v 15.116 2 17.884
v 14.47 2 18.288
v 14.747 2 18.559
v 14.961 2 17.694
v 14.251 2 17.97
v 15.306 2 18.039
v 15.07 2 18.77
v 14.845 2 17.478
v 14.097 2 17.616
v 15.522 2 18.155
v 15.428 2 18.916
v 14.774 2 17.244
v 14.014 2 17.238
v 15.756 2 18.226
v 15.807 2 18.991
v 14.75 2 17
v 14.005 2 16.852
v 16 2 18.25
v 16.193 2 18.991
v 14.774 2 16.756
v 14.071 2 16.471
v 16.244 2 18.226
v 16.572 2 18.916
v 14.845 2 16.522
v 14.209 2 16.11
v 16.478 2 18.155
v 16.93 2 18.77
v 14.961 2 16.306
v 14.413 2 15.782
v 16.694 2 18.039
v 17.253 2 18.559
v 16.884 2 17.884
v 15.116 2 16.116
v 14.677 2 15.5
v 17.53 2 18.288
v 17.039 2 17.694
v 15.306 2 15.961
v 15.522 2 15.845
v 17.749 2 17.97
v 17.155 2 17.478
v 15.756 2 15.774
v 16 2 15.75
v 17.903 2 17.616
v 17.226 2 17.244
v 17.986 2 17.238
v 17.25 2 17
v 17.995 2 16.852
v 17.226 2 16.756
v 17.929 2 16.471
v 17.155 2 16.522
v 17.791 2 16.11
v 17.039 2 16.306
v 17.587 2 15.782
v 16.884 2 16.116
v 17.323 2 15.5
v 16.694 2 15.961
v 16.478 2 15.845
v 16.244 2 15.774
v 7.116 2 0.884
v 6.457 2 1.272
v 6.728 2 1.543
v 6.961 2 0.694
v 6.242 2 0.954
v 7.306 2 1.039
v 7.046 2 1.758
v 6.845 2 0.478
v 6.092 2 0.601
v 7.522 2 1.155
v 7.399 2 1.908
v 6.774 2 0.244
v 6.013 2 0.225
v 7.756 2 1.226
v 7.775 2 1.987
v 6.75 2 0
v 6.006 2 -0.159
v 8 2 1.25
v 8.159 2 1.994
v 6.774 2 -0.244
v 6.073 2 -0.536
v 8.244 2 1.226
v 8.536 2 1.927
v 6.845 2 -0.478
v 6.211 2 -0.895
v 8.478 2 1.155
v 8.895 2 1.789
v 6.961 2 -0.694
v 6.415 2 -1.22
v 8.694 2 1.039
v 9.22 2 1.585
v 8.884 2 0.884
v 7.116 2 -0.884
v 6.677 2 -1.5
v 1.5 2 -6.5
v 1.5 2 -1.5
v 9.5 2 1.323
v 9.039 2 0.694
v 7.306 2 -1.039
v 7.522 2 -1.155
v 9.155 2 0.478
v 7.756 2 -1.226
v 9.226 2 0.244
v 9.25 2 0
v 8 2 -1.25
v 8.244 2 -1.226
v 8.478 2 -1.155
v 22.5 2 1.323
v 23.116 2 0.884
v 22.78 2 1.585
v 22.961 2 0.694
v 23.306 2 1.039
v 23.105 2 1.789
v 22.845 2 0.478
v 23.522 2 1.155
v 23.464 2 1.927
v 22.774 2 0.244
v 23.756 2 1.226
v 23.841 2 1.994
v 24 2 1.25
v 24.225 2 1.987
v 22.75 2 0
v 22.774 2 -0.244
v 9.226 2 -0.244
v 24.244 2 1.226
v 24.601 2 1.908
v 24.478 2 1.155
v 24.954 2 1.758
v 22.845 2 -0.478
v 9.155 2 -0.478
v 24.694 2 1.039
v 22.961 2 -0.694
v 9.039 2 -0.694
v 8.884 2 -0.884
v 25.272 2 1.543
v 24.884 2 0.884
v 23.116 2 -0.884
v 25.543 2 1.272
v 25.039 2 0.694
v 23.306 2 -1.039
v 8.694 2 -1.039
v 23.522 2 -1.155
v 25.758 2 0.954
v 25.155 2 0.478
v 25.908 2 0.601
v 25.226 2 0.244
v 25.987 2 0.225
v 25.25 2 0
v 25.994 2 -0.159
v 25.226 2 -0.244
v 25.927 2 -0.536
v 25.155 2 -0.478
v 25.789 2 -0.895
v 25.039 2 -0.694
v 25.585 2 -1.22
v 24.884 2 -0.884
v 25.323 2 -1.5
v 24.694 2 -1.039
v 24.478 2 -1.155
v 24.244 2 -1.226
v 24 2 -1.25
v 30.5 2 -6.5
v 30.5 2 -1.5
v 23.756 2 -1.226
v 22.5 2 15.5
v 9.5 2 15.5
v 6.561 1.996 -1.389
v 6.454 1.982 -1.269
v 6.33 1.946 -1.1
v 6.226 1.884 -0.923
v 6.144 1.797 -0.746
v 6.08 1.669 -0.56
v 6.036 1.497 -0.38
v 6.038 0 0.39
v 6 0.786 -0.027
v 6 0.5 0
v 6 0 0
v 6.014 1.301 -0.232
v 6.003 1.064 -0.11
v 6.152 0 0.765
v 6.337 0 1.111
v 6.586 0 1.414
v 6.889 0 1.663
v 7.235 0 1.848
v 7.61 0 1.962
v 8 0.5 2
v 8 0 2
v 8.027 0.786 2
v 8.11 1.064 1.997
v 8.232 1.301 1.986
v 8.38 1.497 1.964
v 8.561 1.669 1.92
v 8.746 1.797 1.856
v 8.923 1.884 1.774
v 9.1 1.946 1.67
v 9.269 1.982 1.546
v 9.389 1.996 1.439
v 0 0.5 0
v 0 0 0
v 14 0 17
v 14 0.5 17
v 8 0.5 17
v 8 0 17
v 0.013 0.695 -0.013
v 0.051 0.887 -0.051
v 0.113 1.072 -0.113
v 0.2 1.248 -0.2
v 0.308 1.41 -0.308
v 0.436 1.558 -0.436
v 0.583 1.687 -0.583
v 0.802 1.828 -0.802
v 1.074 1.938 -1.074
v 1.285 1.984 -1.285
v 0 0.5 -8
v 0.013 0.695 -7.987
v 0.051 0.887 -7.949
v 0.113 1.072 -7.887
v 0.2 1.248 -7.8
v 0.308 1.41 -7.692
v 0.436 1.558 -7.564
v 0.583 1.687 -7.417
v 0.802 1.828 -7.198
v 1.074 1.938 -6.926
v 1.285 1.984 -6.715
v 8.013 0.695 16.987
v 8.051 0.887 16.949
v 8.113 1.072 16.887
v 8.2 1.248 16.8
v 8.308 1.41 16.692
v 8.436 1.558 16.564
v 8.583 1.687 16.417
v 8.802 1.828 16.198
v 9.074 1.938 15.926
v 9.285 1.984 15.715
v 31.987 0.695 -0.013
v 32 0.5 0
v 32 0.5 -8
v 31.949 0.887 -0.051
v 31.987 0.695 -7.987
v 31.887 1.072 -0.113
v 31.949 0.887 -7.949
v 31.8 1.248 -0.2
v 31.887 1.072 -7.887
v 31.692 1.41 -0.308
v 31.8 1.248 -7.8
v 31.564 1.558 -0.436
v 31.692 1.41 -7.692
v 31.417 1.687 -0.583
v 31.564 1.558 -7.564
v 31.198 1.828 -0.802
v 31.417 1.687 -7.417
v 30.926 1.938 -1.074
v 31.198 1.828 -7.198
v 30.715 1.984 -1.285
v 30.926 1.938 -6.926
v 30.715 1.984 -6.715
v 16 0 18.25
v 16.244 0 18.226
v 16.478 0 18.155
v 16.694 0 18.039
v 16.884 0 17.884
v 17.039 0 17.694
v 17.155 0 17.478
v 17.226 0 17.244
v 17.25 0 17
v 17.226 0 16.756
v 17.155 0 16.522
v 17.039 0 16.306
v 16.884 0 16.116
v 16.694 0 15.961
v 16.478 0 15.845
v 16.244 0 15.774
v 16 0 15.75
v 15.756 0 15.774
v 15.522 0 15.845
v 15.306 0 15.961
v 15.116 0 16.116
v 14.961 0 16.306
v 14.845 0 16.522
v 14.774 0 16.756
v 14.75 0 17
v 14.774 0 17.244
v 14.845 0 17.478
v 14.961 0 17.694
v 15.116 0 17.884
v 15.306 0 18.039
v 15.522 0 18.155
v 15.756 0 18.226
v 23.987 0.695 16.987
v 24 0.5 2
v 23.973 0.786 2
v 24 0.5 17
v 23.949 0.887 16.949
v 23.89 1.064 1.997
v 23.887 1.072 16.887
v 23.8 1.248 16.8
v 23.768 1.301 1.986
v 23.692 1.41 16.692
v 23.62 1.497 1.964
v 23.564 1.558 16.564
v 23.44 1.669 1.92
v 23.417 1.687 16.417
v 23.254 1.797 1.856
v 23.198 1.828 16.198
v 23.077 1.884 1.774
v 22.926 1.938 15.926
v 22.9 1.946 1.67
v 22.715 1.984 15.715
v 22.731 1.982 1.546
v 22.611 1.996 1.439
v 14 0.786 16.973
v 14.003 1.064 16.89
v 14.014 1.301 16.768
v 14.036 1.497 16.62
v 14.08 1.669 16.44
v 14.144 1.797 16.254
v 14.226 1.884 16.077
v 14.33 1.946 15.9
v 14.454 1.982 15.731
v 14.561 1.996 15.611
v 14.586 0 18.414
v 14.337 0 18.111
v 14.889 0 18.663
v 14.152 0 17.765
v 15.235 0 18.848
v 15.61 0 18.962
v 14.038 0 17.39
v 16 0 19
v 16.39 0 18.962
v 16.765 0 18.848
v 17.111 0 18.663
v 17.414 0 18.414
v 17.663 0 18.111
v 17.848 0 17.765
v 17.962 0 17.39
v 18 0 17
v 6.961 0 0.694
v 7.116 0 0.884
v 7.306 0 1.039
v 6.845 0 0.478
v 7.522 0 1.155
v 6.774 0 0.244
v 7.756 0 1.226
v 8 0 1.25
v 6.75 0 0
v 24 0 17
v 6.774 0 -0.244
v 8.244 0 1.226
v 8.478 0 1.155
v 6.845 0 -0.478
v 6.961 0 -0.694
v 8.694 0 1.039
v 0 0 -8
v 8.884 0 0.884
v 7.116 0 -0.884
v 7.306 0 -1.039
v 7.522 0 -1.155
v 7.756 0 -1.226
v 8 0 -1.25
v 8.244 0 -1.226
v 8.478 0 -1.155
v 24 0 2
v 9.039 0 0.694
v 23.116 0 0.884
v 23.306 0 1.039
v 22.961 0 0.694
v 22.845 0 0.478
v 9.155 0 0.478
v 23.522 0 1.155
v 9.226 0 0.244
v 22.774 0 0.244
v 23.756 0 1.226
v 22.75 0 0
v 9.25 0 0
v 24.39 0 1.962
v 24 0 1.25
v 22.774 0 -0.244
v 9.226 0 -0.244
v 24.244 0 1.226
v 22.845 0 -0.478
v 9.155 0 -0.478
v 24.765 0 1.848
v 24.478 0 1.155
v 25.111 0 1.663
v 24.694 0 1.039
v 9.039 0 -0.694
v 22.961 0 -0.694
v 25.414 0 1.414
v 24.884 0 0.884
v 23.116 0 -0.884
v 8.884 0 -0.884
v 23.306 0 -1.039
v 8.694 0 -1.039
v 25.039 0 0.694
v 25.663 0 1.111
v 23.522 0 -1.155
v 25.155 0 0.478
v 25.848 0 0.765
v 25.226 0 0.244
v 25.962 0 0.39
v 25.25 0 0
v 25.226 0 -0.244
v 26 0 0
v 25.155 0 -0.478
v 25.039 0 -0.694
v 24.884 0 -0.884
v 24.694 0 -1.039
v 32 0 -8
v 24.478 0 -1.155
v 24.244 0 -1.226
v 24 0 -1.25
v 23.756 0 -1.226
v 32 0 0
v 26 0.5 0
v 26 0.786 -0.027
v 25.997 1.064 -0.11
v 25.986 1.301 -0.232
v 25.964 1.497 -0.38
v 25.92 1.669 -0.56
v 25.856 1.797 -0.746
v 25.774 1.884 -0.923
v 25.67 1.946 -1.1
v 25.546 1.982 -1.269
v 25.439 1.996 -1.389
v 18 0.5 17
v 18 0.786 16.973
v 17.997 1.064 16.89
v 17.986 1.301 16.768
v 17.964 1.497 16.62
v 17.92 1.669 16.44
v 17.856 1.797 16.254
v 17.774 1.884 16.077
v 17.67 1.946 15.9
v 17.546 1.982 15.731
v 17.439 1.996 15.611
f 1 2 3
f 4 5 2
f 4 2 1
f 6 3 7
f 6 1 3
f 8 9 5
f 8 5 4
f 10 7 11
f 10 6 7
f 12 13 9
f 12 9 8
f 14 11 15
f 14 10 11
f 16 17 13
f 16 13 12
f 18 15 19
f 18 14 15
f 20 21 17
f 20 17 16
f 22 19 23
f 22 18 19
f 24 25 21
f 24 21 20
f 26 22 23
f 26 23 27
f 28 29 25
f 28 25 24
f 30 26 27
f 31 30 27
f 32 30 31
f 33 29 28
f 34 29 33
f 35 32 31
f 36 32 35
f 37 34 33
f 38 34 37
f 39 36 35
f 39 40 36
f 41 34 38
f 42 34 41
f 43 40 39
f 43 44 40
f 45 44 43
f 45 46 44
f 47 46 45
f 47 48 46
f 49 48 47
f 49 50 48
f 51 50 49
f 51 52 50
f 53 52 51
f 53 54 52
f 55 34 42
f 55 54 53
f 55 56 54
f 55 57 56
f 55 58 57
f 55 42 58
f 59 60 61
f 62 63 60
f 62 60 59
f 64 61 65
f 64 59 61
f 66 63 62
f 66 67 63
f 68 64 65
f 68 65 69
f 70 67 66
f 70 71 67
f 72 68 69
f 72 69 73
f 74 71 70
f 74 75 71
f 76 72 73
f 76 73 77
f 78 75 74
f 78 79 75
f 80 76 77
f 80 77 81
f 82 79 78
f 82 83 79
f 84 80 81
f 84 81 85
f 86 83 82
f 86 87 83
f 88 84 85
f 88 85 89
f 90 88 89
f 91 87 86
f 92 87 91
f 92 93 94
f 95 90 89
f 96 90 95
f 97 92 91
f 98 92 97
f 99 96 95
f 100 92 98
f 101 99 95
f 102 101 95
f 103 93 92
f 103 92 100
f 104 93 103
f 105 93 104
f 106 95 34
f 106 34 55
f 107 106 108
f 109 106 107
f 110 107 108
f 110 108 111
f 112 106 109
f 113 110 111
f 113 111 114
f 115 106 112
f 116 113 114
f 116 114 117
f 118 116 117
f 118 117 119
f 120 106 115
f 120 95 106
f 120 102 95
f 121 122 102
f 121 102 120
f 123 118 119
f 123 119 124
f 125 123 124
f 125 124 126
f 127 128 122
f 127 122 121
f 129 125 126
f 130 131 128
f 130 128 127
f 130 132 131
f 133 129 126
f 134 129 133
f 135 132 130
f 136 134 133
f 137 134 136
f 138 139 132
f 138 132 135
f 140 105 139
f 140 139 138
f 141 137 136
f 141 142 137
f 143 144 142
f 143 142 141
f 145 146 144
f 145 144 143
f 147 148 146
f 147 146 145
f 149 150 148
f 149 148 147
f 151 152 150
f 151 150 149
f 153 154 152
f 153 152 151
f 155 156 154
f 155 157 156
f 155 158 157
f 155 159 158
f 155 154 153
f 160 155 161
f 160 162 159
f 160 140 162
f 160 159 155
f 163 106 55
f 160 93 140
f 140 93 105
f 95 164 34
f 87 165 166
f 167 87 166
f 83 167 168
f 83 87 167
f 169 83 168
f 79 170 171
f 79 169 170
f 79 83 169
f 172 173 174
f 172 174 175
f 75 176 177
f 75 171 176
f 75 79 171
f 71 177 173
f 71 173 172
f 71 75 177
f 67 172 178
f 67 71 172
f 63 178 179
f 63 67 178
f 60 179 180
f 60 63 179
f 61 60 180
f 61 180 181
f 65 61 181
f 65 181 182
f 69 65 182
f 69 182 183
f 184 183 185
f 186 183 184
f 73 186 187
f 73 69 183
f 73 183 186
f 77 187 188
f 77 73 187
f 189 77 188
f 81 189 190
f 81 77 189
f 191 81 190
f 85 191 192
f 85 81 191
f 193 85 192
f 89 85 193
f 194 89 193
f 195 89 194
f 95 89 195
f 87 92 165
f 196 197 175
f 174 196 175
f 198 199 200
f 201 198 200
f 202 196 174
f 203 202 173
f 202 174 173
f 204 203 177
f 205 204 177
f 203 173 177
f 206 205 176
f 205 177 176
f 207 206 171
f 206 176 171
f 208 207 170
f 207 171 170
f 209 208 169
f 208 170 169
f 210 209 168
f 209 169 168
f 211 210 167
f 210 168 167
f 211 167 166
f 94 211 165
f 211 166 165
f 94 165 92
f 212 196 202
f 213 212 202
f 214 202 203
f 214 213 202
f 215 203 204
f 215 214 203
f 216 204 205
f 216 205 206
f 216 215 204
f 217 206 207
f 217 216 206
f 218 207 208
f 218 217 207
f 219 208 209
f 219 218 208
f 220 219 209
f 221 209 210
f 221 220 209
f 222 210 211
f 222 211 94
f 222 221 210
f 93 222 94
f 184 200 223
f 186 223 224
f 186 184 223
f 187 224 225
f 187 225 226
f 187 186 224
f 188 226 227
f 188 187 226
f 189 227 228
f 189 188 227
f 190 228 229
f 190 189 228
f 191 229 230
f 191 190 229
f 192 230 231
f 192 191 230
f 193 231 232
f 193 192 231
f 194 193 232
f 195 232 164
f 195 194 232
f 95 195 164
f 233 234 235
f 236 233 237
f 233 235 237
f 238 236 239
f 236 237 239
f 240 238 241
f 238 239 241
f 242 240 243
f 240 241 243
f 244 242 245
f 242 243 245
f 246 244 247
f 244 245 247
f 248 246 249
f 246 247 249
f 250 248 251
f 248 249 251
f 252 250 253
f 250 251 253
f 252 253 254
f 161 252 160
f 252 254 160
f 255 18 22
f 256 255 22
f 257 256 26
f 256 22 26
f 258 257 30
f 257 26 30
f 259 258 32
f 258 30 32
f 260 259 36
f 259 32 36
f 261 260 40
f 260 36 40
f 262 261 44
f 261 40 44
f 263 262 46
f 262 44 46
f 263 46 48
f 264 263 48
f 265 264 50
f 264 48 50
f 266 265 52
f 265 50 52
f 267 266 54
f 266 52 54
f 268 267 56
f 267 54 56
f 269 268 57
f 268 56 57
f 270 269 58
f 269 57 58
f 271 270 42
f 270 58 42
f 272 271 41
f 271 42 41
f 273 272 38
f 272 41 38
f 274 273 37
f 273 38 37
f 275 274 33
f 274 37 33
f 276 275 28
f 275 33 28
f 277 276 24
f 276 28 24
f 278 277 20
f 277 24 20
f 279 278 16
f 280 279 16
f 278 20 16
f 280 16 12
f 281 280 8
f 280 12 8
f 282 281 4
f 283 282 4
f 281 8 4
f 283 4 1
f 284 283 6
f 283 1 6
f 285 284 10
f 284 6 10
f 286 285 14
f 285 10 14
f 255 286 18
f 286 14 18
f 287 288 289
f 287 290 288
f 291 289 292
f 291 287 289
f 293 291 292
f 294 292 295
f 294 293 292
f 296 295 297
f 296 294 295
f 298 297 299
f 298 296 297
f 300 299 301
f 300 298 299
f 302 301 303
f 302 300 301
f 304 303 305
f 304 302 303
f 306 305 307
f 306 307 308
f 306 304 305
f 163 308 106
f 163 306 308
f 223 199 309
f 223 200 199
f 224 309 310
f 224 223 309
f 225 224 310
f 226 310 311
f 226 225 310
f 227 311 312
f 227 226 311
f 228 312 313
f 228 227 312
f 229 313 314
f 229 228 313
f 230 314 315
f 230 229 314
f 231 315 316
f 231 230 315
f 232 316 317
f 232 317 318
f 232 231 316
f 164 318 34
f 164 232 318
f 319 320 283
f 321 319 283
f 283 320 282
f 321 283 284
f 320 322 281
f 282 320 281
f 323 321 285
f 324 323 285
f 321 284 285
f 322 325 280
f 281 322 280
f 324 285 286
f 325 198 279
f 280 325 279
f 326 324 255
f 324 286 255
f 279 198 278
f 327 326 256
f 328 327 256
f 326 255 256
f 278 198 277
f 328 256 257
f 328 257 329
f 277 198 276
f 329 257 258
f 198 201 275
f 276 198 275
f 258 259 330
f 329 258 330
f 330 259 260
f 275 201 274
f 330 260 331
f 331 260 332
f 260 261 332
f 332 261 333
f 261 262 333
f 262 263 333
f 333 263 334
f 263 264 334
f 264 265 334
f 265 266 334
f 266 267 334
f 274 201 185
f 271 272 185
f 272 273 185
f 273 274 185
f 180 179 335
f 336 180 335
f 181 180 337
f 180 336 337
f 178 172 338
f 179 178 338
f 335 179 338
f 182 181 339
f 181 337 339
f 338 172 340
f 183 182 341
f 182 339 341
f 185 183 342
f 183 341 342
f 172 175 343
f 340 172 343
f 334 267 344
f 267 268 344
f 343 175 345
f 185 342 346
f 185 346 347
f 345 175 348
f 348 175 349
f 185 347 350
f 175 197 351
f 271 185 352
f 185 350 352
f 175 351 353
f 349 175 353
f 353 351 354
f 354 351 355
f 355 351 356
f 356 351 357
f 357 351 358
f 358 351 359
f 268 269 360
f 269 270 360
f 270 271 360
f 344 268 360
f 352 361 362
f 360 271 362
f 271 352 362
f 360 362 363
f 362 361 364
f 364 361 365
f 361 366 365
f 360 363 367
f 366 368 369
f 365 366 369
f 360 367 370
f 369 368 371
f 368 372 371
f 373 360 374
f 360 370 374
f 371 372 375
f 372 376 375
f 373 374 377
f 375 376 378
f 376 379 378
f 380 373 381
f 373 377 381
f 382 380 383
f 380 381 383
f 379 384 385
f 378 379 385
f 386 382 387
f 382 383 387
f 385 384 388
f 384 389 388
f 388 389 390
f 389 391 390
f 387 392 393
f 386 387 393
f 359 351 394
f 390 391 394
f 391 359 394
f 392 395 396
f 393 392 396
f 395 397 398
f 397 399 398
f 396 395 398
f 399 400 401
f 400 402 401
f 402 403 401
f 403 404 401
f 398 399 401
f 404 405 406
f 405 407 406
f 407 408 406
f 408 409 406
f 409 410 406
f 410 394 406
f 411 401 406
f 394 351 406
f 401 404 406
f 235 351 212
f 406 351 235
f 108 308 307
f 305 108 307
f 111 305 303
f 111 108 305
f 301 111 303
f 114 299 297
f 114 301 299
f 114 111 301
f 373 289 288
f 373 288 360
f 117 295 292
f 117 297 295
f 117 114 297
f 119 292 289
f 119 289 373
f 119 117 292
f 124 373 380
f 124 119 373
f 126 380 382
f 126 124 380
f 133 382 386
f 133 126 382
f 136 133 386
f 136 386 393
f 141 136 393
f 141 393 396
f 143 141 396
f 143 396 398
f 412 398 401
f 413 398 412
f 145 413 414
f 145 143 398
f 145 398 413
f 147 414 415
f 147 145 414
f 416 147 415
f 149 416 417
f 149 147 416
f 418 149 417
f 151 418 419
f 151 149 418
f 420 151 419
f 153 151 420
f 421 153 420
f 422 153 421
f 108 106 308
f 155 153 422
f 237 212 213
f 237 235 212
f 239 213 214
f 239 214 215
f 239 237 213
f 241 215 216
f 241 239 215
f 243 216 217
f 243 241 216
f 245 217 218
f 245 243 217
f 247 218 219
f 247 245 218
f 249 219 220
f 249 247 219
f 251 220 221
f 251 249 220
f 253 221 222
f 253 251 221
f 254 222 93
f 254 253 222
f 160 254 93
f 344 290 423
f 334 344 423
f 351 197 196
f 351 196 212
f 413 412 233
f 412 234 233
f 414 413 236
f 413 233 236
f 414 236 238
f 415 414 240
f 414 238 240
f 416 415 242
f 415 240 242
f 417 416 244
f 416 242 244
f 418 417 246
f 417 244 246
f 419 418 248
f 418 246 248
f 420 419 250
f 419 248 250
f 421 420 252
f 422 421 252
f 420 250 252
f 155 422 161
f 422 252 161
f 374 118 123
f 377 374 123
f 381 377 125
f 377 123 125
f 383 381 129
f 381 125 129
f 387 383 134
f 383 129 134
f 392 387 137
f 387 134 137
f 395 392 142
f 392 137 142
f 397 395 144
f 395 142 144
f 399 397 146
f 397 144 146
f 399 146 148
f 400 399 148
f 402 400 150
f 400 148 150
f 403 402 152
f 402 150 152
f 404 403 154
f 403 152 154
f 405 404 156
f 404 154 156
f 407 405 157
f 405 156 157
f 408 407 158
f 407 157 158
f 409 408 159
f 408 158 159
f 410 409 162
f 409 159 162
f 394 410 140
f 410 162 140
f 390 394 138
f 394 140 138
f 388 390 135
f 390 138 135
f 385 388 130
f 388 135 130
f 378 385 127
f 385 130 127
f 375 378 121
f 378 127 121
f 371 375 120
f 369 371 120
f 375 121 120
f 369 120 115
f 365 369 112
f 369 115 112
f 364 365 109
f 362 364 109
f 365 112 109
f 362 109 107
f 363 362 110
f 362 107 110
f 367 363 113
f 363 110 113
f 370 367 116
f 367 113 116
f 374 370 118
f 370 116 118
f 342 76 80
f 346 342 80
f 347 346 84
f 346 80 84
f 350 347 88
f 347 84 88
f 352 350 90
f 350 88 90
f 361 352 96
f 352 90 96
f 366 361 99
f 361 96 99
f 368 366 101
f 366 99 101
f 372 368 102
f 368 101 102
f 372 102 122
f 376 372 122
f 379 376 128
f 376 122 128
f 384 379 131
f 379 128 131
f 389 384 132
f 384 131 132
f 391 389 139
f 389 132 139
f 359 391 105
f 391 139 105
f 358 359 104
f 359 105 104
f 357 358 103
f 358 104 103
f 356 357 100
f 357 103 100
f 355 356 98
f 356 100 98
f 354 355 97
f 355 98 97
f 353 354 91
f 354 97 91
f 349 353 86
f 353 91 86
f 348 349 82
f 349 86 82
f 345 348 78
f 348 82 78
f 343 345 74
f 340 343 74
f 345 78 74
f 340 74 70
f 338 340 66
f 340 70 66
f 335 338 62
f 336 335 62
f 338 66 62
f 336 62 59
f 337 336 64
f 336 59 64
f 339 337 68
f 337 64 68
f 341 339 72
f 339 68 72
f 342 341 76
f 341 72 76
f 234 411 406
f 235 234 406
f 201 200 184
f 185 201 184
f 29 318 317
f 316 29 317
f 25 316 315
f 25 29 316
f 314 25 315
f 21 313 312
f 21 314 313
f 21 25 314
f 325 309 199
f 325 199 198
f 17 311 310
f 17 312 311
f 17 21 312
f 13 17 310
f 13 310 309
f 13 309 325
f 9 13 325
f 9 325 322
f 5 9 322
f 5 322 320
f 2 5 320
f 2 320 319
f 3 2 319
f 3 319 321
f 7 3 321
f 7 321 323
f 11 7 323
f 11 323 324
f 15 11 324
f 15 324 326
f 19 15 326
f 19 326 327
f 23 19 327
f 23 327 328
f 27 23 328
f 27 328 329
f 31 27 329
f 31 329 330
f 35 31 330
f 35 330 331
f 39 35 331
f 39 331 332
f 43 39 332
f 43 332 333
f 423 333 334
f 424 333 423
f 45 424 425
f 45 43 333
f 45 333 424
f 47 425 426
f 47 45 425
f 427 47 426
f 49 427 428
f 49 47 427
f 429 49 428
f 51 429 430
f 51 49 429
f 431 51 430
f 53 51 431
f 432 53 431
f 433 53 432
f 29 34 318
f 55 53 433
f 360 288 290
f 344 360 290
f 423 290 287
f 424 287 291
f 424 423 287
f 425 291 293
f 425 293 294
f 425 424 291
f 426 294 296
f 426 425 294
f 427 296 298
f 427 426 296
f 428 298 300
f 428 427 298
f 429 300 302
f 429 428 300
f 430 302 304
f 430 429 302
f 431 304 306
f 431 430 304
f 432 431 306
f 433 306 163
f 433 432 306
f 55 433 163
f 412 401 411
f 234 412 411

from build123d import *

# Parameters (mm, degrees)
ESQUISSE1_W             = 32
ESQUISSE1_H             = 8
BOSS_EXTRU_1_DEPTH      = 2
BOSS_EXTRU_2_DEPTH      = 2
ESQUISSE3_R             = 1.9999999999999996
ESQUISSE3_R_2           = 2.000000000000003
ESQUISSE3_R_3           = 1.9999999999999991
BOSS_EXTRU_3_DEPTH      = 2
ESQUISSE4_R             = 1.2499999999999991
ESQUISSE4_R_2           = 1.250000000000001
ESQUISSE4_R_3           = 1.2500000000000013
ENL_V_MAT_EXTRU_1_DEPTH = 2
CONG_1_R                = 1.5


with BuildPart() as part:
    # Esquisse1 → Boss.-Extru.1 (new body)
    with BuildSketch(Plane(origin=(0, 0, 0), x_dir=(1, 0, 0), z_dir=(0, 1, 0))):
        with Locations((16, 4)):
            Rectangle(ESQUISSE1_W, ESQUISSE1_H)
    extrude(amount=BOSS_EXTRU_1_DEPTH)

    # Esquisse2 → Boss.-Extru.2 (add)
    with BuildSketch(Plane(origin=(0, 2, 0), x_dir=(1, 0, 0), z_dir=(0, 1, 0))):
        Polygon((8.000000000000002, 4.5e-16), (24, 2.41e-15), (24.000000000000004, -17), (8.000000000000004, -17), align=None)
    extrude(amount=-BOSS_EXTRU_2_DEPTH)

    # Esquisse3 → Boss.-Extru.3 (add)
    with BuildSketch(Plane(origin=(0, 2, 0), x_dir=(1, 0, 0), z_dir=(0, 1, 0))):
        with Locations((8.000000000000002, 0)):
            Circle(ESQUISSE3_R)
        with Locations((24, 2.41e-15)):
            Circle(ESQUISSE3_R_2)
        with Locations((16.000000000000004, -17)):
            Circle(ESQUISSE3_R_3)
    extrude(amount=-BOSS_EXTRU_3_DEPTH)

    # Esquisse4 → Enlèv. mat.-Extru.1 (cut)
    with BuildSketch(Plane(origin=(0, 2, 0), x_dir=(1, 0, 0), z_dir=(0, 1, 0))):
        with Locations(Location((8.000000000000002, 0, 0), (0, 0, 270))):
            Circle(ESQUISSE4_R)
        with Locations(Location((24, 2.41e-15, 0), (0, 0, 270))):
            Circle(ESQUISSE4_R_2)
        with Locations(Location((16.000000000000004, -17, 0), (0, 0, 270))):
            Circle(ESQUISSE4_R_3)
    extrude(amount=-ENL_V_MAT_EXTRU_1_DEPTH, mode=Mode.SUBTRACT)

    # Congé1
    cong_1_edges = [part.edges().sort_by_distance(p)[0] for p in [
        (32, 2, -4),
        (16, 2, -8),
        (11.000000000000004, 2, 17),
        (24.000000000000004, 2, 9.500000000000002),
        (8.000000000000004, 2, 9.5),
        (29, 2, 0),
        (0, 2, -4),
        (21.000000000000004, 2, 17),
        (3.000000000000001, 2, 0),
    ]]
    fillet(cong_1_edges, radius=CONG_1_R)


solid = part.part
